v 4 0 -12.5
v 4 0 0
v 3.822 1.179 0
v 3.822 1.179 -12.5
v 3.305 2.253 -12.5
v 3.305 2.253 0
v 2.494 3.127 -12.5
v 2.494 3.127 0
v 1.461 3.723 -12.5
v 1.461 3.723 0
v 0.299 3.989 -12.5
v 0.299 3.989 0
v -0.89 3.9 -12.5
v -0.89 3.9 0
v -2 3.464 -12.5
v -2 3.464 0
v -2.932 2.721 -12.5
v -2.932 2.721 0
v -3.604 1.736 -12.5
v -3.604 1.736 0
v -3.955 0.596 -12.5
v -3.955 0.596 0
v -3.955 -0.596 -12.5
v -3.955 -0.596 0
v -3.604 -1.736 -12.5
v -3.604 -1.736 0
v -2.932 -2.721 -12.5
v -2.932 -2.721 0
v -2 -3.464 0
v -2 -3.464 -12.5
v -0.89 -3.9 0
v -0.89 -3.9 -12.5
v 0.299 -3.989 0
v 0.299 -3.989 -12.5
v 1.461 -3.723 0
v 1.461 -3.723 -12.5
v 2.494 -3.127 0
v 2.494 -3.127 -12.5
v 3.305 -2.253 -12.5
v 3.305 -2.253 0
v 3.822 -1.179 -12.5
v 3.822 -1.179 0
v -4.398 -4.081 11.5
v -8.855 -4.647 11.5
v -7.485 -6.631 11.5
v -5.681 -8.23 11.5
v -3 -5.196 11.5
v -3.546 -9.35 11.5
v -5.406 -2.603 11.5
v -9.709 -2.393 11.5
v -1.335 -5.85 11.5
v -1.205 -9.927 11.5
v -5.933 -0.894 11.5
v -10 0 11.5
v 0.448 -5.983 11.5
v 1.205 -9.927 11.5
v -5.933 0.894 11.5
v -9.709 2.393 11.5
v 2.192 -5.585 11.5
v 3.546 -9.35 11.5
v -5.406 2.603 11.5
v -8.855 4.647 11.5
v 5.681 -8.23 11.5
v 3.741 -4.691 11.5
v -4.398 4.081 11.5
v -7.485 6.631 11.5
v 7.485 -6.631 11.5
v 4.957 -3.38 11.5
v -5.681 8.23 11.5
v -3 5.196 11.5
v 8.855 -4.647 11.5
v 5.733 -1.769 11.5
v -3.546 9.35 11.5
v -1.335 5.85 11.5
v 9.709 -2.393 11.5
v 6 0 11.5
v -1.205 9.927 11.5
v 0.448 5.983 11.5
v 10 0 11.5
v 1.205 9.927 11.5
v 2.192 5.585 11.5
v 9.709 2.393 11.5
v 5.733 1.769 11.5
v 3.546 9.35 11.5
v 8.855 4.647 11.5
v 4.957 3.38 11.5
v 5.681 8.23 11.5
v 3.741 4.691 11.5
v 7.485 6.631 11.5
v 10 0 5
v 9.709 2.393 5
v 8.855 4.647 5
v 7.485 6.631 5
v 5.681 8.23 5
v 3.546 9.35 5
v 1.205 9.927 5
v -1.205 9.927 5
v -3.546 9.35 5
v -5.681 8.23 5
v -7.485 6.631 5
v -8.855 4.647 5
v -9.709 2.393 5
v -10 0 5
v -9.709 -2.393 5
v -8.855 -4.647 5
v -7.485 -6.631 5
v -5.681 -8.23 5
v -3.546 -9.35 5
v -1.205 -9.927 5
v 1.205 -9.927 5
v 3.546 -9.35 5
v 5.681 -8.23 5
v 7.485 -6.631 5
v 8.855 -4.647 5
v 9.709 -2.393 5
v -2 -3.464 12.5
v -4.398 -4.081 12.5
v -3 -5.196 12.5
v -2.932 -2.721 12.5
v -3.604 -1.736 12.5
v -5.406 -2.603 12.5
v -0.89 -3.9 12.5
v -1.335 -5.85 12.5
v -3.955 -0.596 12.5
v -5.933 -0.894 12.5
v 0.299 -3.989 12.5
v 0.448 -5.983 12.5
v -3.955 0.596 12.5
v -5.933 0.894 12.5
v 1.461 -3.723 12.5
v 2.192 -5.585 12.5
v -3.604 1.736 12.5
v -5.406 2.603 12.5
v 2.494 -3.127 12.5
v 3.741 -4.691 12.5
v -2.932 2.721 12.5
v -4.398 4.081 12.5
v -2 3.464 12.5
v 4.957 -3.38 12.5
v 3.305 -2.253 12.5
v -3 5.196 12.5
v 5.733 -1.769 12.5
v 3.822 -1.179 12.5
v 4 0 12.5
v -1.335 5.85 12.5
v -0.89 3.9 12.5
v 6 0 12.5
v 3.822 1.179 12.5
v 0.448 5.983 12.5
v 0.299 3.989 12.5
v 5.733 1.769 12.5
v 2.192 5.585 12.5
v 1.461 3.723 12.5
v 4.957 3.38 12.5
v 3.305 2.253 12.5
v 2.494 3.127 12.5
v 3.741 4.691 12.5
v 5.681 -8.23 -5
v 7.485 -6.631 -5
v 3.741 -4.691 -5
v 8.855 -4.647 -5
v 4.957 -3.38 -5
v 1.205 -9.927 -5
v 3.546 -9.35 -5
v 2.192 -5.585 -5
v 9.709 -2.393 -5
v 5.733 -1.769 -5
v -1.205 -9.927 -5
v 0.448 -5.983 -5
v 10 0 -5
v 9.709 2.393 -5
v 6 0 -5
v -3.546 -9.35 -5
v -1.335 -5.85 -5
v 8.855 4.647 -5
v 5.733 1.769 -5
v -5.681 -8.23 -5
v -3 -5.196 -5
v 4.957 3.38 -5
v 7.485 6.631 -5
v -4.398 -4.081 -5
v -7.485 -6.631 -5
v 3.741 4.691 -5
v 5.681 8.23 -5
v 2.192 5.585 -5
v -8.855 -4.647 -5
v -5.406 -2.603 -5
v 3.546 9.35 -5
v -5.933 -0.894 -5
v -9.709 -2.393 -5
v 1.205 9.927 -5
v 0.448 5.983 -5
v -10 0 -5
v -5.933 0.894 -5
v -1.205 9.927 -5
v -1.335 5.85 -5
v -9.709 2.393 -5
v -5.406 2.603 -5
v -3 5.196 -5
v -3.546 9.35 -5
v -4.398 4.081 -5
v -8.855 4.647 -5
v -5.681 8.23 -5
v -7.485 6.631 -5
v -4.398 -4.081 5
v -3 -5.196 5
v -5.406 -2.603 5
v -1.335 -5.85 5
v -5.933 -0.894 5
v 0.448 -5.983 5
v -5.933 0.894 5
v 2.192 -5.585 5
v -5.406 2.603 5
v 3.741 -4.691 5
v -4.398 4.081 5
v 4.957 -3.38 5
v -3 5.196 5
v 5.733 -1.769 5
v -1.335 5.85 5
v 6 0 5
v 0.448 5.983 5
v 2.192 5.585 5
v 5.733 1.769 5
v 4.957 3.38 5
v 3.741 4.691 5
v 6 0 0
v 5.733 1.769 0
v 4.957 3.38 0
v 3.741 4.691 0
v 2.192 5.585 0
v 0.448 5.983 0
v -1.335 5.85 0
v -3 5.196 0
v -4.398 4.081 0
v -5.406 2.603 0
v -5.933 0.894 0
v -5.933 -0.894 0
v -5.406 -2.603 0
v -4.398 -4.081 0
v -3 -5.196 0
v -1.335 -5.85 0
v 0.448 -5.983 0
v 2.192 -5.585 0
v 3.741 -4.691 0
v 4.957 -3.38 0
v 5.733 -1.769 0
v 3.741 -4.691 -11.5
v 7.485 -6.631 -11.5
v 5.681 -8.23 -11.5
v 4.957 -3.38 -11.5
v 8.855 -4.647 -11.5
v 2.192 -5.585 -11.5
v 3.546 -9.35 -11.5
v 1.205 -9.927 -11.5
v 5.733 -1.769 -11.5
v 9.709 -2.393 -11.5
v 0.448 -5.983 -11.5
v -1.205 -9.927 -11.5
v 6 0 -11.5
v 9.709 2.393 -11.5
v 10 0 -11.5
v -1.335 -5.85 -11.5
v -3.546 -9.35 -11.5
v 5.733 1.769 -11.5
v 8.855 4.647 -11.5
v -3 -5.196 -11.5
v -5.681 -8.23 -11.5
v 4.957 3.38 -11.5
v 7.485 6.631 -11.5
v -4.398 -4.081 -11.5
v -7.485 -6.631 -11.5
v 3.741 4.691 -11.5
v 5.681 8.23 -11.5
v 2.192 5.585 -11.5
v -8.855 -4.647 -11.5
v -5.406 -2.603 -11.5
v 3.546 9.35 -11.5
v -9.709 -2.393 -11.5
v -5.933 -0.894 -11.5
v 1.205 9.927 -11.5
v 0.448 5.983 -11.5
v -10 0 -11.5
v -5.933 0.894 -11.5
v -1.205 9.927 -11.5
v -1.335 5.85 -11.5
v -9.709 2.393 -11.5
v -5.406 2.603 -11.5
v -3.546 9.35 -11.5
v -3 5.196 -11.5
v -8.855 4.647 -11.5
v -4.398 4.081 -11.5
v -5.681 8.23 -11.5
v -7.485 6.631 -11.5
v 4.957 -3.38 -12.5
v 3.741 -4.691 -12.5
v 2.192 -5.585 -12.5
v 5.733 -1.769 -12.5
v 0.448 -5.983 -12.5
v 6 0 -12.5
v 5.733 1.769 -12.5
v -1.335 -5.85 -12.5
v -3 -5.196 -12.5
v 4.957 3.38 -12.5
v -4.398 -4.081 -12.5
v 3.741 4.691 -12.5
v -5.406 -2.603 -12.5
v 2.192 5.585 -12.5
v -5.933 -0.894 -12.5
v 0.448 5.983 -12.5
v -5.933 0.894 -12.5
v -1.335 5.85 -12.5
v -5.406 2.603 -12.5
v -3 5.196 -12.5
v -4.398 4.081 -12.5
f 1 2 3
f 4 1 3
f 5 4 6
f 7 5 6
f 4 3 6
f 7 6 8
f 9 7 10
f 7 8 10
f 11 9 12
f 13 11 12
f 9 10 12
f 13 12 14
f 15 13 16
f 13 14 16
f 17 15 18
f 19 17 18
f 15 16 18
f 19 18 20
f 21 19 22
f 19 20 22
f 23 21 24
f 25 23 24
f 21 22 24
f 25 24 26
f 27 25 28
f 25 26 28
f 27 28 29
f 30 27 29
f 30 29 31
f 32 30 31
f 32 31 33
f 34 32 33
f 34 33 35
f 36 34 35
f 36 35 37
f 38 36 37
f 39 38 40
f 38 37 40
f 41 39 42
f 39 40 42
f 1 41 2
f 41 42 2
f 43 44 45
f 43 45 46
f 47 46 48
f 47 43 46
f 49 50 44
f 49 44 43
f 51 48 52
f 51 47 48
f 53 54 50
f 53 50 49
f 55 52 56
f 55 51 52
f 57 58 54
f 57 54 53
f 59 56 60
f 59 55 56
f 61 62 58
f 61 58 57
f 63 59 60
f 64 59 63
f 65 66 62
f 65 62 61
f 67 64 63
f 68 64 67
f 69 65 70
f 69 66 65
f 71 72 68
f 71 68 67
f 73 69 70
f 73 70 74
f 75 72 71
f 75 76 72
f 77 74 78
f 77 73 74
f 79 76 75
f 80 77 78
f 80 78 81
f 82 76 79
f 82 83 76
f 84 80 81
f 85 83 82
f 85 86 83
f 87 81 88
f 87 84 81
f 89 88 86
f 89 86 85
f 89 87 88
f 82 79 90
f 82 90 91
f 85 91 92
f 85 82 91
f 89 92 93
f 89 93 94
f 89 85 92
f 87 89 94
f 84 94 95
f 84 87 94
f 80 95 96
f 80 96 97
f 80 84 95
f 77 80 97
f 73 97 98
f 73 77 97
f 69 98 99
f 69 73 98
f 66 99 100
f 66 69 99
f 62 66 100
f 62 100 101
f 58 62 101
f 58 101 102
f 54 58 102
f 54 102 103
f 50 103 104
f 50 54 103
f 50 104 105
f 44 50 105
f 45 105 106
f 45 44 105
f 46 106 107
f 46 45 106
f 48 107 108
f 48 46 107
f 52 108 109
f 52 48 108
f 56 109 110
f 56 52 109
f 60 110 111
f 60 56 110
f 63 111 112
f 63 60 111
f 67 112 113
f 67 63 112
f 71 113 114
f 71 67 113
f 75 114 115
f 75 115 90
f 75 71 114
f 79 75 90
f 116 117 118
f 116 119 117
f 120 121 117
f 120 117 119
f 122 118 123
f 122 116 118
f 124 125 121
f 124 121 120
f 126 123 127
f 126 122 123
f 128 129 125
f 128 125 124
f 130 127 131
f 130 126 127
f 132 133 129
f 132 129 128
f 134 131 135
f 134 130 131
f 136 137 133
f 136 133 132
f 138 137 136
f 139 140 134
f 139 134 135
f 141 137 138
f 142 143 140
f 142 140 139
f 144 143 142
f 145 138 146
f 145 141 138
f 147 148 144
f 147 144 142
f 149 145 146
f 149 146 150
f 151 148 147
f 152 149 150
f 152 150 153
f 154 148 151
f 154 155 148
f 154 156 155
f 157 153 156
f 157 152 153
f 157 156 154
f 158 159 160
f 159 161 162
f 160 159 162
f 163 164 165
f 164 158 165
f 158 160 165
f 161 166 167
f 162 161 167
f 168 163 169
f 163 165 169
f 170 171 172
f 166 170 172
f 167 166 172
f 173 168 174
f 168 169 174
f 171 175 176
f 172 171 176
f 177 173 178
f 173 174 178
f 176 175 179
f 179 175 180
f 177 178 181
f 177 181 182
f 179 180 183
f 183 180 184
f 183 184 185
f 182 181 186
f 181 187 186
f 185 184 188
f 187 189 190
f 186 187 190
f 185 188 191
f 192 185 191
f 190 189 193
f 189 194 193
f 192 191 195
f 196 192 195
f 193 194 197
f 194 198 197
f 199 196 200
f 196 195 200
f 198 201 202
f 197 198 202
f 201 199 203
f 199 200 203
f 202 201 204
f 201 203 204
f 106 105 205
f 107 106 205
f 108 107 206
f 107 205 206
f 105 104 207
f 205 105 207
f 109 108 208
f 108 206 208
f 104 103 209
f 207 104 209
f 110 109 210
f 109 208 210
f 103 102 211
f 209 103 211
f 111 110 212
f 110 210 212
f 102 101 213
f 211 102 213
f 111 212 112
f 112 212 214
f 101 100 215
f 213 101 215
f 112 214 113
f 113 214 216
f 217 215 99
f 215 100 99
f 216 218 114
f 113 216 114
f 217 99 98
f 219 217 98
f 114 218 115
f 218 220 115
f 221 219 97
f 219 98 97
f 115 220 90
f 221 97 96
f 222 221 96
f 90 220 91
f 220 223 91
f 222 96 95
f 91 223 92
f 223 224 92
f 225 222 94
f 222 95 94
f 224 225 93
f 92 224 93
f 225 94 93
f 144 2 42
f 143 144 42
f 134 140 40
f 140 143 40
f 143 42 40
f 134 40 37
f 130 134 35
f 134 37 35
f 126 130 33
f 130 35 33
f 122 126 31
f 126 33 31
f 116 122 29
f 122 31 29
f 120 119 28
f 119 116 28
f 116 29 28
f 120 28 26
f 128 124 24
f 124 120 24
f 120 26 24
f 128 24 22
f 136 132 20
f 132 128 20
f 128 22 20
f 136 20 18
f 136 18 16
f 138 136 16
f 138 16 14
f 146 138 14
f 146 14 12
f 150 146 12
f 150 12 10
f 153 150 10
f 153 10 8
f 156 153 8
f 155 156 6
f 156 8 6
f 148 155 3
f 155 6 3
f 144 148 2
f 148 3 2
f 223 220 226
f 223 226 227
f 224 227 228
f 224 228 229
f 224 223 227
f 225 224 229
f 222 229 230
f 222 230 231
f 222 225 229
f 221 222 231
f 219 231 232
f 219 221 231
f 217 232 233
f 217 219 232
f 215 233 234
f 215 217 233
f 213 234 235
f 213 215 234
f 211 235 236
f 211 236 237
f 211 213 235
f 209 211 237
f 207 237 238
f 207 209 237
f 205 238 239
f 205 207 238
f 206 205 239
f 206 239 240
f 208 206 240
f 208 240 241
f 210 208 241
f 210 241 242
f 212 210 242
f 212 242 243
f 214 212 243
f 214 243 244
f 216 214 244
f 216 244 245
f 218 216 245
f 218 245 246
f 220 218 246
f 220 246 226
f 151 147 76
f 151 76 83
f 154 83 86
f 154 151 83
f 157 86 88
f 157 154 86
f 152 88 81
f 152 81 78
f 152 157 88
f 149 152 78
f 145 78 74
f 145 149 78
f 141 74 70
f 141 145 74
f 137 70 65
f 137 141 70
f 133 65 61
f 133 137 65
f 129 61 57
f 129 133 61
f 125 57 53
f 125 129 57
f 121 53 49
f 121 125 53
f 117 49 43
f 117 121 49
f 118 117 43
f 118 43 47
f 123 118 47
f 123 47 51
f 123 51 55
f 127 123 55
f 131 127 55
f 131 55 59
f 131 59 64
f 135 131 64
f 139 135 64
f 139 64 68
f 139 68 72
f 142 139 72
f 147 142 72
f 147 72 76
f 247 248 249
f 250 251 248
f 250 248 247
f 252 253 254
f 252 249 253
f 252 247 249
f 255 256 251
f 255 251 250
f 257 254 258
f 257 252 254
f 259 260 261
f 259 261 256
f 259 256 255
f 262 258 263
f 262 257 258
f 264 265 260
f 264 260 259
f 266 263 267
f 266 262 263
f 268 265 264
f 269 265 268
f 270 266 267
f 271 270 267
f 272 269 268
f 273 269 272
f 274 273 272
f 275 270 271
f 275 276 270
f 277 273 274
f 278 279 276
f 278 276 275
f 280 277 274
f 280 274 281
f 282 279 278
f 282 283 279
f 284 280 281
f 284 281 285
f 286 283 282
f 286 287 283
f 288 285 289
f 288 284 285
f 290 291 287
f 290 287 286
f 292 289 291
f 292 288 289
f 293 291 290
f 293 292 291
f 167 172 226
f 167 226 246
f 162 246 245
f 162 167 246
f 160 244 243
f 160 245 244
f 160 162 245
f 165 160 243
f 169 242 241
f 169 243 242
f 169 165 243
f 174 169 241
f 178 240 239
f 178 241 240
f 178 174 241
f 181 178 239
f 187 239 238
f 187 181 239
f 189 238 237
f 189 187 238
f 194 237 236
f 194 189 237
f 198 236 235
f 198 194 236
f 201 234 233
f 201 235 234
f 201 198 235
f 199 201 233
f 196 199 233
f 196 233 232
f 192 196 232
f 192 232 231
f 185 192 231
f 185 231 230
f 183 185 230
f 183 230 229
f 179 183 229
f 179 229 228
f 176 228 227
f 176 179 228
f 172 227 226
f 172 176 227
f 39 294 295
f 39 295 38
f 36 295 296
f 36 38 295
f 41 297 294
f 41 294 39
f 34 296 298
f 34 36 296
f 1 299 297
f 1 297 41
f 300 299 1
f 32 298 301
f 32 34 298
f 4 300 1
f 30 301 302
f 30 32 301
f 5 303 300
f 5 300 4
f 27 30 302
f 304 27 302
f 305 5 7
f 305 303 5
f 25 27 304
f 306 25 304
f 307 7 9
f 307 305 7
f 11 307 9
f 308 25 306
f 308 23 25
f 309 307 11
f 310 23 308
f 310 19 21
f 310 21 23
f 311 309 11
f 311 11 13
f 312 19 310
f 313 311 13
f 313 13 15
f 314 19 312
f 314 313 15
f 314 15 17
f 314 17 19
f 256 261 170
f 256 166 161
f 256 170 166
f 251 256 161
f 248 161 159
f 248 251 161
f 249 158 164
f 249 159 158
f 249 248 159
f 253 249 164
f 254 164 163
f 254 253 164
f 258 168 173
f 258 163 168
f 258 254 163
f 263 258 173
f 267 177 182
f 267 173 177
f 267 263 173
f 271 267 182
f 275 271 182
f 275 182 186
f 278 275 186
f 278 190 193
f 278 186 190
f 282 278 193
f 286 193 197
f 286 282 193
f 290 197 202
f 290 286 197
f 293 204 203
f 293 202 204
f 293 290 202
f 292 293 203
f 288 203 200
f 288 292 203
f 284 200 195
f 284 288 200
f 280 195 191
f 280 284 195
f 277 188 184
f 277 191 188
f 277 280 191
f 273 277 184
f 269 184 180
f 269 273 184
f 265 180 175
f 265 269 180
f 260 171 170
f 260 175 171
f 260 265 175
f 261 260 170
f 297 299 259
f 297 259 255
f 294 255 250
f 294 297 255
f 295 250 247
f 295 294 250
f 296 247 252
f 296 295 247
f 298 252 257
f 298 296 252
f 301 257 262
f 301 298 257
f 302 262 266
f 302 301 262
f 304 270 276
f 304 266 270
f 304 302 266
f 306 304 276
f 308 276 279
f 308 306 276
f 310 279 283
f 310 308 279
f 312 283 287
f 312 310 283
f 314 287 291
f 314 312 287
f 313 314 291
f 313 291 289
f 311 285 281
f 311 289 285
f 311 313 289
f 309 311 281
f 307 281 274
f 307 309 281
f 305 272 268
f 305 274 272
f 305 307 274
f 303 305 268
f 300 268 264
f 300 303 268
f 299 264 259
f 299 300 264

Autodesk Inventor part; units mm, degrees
ref_plane "YZ Plane" through (0, 0, 0) normal (1, 0, 0) x (0, 1, 0)
ref_plane "XZ Plane" through (0, 0, 0) normal (0, 1, 0) x (-1, 0, 0)
ref_plane "XY Plane" through (0, 0, 0) normal (0, 0, 1) x (1, 0, 0)
sketch "スケッチ2" plane through (0, 0, 0) normal (0, 1, 0) x (-1, 0, 0)
  line L0 (-6, 0) -> (-6, 5)
  line L1 (-6, 5) -> (-10, 5)
  line L2 (-10, 5) -> (-10, 11.5)
  line L3 (-10, 11.5) -> (-6, 11.5)
  line L4 (-6, 11.5) -> (-6, 12.5)
  line L5 (-6, 12.5) -> (-4, 12.5)
  line L6 (-4, 12.5) -> (-4, 0)
  line L7 (-4, 0) -> (-6, 0)
  line L8 (0, -14.5) -> (0, 17) projected
  circle A0 centre (0, 0) radius 4 construction
  circle A1 centre (0, 0) radius 10 construction
  circle A2 centre (0, 0) radius 6.7 construction
  dimension "d4" = 4
  dimension "d5" = 6
  dimension "d6" = 10
  dimension "d7" = 12.5
  dimension "d8" = 5
  dimension "d9" = 1
  dimension "d11" = 8
  dimension "d12" = 20
  dimension "d14" = 3.3
revolve "回転1" add sketch "スケッチ2" angle 360 about axis through (0, 0, -10) along (0, 0, 1)
mirror "ミラー1" about plane through (6, 0, 0) normal (0, 0, -1) of "回転1"
properties part number "POMベアリング" material "アセタール樹脂、白"
